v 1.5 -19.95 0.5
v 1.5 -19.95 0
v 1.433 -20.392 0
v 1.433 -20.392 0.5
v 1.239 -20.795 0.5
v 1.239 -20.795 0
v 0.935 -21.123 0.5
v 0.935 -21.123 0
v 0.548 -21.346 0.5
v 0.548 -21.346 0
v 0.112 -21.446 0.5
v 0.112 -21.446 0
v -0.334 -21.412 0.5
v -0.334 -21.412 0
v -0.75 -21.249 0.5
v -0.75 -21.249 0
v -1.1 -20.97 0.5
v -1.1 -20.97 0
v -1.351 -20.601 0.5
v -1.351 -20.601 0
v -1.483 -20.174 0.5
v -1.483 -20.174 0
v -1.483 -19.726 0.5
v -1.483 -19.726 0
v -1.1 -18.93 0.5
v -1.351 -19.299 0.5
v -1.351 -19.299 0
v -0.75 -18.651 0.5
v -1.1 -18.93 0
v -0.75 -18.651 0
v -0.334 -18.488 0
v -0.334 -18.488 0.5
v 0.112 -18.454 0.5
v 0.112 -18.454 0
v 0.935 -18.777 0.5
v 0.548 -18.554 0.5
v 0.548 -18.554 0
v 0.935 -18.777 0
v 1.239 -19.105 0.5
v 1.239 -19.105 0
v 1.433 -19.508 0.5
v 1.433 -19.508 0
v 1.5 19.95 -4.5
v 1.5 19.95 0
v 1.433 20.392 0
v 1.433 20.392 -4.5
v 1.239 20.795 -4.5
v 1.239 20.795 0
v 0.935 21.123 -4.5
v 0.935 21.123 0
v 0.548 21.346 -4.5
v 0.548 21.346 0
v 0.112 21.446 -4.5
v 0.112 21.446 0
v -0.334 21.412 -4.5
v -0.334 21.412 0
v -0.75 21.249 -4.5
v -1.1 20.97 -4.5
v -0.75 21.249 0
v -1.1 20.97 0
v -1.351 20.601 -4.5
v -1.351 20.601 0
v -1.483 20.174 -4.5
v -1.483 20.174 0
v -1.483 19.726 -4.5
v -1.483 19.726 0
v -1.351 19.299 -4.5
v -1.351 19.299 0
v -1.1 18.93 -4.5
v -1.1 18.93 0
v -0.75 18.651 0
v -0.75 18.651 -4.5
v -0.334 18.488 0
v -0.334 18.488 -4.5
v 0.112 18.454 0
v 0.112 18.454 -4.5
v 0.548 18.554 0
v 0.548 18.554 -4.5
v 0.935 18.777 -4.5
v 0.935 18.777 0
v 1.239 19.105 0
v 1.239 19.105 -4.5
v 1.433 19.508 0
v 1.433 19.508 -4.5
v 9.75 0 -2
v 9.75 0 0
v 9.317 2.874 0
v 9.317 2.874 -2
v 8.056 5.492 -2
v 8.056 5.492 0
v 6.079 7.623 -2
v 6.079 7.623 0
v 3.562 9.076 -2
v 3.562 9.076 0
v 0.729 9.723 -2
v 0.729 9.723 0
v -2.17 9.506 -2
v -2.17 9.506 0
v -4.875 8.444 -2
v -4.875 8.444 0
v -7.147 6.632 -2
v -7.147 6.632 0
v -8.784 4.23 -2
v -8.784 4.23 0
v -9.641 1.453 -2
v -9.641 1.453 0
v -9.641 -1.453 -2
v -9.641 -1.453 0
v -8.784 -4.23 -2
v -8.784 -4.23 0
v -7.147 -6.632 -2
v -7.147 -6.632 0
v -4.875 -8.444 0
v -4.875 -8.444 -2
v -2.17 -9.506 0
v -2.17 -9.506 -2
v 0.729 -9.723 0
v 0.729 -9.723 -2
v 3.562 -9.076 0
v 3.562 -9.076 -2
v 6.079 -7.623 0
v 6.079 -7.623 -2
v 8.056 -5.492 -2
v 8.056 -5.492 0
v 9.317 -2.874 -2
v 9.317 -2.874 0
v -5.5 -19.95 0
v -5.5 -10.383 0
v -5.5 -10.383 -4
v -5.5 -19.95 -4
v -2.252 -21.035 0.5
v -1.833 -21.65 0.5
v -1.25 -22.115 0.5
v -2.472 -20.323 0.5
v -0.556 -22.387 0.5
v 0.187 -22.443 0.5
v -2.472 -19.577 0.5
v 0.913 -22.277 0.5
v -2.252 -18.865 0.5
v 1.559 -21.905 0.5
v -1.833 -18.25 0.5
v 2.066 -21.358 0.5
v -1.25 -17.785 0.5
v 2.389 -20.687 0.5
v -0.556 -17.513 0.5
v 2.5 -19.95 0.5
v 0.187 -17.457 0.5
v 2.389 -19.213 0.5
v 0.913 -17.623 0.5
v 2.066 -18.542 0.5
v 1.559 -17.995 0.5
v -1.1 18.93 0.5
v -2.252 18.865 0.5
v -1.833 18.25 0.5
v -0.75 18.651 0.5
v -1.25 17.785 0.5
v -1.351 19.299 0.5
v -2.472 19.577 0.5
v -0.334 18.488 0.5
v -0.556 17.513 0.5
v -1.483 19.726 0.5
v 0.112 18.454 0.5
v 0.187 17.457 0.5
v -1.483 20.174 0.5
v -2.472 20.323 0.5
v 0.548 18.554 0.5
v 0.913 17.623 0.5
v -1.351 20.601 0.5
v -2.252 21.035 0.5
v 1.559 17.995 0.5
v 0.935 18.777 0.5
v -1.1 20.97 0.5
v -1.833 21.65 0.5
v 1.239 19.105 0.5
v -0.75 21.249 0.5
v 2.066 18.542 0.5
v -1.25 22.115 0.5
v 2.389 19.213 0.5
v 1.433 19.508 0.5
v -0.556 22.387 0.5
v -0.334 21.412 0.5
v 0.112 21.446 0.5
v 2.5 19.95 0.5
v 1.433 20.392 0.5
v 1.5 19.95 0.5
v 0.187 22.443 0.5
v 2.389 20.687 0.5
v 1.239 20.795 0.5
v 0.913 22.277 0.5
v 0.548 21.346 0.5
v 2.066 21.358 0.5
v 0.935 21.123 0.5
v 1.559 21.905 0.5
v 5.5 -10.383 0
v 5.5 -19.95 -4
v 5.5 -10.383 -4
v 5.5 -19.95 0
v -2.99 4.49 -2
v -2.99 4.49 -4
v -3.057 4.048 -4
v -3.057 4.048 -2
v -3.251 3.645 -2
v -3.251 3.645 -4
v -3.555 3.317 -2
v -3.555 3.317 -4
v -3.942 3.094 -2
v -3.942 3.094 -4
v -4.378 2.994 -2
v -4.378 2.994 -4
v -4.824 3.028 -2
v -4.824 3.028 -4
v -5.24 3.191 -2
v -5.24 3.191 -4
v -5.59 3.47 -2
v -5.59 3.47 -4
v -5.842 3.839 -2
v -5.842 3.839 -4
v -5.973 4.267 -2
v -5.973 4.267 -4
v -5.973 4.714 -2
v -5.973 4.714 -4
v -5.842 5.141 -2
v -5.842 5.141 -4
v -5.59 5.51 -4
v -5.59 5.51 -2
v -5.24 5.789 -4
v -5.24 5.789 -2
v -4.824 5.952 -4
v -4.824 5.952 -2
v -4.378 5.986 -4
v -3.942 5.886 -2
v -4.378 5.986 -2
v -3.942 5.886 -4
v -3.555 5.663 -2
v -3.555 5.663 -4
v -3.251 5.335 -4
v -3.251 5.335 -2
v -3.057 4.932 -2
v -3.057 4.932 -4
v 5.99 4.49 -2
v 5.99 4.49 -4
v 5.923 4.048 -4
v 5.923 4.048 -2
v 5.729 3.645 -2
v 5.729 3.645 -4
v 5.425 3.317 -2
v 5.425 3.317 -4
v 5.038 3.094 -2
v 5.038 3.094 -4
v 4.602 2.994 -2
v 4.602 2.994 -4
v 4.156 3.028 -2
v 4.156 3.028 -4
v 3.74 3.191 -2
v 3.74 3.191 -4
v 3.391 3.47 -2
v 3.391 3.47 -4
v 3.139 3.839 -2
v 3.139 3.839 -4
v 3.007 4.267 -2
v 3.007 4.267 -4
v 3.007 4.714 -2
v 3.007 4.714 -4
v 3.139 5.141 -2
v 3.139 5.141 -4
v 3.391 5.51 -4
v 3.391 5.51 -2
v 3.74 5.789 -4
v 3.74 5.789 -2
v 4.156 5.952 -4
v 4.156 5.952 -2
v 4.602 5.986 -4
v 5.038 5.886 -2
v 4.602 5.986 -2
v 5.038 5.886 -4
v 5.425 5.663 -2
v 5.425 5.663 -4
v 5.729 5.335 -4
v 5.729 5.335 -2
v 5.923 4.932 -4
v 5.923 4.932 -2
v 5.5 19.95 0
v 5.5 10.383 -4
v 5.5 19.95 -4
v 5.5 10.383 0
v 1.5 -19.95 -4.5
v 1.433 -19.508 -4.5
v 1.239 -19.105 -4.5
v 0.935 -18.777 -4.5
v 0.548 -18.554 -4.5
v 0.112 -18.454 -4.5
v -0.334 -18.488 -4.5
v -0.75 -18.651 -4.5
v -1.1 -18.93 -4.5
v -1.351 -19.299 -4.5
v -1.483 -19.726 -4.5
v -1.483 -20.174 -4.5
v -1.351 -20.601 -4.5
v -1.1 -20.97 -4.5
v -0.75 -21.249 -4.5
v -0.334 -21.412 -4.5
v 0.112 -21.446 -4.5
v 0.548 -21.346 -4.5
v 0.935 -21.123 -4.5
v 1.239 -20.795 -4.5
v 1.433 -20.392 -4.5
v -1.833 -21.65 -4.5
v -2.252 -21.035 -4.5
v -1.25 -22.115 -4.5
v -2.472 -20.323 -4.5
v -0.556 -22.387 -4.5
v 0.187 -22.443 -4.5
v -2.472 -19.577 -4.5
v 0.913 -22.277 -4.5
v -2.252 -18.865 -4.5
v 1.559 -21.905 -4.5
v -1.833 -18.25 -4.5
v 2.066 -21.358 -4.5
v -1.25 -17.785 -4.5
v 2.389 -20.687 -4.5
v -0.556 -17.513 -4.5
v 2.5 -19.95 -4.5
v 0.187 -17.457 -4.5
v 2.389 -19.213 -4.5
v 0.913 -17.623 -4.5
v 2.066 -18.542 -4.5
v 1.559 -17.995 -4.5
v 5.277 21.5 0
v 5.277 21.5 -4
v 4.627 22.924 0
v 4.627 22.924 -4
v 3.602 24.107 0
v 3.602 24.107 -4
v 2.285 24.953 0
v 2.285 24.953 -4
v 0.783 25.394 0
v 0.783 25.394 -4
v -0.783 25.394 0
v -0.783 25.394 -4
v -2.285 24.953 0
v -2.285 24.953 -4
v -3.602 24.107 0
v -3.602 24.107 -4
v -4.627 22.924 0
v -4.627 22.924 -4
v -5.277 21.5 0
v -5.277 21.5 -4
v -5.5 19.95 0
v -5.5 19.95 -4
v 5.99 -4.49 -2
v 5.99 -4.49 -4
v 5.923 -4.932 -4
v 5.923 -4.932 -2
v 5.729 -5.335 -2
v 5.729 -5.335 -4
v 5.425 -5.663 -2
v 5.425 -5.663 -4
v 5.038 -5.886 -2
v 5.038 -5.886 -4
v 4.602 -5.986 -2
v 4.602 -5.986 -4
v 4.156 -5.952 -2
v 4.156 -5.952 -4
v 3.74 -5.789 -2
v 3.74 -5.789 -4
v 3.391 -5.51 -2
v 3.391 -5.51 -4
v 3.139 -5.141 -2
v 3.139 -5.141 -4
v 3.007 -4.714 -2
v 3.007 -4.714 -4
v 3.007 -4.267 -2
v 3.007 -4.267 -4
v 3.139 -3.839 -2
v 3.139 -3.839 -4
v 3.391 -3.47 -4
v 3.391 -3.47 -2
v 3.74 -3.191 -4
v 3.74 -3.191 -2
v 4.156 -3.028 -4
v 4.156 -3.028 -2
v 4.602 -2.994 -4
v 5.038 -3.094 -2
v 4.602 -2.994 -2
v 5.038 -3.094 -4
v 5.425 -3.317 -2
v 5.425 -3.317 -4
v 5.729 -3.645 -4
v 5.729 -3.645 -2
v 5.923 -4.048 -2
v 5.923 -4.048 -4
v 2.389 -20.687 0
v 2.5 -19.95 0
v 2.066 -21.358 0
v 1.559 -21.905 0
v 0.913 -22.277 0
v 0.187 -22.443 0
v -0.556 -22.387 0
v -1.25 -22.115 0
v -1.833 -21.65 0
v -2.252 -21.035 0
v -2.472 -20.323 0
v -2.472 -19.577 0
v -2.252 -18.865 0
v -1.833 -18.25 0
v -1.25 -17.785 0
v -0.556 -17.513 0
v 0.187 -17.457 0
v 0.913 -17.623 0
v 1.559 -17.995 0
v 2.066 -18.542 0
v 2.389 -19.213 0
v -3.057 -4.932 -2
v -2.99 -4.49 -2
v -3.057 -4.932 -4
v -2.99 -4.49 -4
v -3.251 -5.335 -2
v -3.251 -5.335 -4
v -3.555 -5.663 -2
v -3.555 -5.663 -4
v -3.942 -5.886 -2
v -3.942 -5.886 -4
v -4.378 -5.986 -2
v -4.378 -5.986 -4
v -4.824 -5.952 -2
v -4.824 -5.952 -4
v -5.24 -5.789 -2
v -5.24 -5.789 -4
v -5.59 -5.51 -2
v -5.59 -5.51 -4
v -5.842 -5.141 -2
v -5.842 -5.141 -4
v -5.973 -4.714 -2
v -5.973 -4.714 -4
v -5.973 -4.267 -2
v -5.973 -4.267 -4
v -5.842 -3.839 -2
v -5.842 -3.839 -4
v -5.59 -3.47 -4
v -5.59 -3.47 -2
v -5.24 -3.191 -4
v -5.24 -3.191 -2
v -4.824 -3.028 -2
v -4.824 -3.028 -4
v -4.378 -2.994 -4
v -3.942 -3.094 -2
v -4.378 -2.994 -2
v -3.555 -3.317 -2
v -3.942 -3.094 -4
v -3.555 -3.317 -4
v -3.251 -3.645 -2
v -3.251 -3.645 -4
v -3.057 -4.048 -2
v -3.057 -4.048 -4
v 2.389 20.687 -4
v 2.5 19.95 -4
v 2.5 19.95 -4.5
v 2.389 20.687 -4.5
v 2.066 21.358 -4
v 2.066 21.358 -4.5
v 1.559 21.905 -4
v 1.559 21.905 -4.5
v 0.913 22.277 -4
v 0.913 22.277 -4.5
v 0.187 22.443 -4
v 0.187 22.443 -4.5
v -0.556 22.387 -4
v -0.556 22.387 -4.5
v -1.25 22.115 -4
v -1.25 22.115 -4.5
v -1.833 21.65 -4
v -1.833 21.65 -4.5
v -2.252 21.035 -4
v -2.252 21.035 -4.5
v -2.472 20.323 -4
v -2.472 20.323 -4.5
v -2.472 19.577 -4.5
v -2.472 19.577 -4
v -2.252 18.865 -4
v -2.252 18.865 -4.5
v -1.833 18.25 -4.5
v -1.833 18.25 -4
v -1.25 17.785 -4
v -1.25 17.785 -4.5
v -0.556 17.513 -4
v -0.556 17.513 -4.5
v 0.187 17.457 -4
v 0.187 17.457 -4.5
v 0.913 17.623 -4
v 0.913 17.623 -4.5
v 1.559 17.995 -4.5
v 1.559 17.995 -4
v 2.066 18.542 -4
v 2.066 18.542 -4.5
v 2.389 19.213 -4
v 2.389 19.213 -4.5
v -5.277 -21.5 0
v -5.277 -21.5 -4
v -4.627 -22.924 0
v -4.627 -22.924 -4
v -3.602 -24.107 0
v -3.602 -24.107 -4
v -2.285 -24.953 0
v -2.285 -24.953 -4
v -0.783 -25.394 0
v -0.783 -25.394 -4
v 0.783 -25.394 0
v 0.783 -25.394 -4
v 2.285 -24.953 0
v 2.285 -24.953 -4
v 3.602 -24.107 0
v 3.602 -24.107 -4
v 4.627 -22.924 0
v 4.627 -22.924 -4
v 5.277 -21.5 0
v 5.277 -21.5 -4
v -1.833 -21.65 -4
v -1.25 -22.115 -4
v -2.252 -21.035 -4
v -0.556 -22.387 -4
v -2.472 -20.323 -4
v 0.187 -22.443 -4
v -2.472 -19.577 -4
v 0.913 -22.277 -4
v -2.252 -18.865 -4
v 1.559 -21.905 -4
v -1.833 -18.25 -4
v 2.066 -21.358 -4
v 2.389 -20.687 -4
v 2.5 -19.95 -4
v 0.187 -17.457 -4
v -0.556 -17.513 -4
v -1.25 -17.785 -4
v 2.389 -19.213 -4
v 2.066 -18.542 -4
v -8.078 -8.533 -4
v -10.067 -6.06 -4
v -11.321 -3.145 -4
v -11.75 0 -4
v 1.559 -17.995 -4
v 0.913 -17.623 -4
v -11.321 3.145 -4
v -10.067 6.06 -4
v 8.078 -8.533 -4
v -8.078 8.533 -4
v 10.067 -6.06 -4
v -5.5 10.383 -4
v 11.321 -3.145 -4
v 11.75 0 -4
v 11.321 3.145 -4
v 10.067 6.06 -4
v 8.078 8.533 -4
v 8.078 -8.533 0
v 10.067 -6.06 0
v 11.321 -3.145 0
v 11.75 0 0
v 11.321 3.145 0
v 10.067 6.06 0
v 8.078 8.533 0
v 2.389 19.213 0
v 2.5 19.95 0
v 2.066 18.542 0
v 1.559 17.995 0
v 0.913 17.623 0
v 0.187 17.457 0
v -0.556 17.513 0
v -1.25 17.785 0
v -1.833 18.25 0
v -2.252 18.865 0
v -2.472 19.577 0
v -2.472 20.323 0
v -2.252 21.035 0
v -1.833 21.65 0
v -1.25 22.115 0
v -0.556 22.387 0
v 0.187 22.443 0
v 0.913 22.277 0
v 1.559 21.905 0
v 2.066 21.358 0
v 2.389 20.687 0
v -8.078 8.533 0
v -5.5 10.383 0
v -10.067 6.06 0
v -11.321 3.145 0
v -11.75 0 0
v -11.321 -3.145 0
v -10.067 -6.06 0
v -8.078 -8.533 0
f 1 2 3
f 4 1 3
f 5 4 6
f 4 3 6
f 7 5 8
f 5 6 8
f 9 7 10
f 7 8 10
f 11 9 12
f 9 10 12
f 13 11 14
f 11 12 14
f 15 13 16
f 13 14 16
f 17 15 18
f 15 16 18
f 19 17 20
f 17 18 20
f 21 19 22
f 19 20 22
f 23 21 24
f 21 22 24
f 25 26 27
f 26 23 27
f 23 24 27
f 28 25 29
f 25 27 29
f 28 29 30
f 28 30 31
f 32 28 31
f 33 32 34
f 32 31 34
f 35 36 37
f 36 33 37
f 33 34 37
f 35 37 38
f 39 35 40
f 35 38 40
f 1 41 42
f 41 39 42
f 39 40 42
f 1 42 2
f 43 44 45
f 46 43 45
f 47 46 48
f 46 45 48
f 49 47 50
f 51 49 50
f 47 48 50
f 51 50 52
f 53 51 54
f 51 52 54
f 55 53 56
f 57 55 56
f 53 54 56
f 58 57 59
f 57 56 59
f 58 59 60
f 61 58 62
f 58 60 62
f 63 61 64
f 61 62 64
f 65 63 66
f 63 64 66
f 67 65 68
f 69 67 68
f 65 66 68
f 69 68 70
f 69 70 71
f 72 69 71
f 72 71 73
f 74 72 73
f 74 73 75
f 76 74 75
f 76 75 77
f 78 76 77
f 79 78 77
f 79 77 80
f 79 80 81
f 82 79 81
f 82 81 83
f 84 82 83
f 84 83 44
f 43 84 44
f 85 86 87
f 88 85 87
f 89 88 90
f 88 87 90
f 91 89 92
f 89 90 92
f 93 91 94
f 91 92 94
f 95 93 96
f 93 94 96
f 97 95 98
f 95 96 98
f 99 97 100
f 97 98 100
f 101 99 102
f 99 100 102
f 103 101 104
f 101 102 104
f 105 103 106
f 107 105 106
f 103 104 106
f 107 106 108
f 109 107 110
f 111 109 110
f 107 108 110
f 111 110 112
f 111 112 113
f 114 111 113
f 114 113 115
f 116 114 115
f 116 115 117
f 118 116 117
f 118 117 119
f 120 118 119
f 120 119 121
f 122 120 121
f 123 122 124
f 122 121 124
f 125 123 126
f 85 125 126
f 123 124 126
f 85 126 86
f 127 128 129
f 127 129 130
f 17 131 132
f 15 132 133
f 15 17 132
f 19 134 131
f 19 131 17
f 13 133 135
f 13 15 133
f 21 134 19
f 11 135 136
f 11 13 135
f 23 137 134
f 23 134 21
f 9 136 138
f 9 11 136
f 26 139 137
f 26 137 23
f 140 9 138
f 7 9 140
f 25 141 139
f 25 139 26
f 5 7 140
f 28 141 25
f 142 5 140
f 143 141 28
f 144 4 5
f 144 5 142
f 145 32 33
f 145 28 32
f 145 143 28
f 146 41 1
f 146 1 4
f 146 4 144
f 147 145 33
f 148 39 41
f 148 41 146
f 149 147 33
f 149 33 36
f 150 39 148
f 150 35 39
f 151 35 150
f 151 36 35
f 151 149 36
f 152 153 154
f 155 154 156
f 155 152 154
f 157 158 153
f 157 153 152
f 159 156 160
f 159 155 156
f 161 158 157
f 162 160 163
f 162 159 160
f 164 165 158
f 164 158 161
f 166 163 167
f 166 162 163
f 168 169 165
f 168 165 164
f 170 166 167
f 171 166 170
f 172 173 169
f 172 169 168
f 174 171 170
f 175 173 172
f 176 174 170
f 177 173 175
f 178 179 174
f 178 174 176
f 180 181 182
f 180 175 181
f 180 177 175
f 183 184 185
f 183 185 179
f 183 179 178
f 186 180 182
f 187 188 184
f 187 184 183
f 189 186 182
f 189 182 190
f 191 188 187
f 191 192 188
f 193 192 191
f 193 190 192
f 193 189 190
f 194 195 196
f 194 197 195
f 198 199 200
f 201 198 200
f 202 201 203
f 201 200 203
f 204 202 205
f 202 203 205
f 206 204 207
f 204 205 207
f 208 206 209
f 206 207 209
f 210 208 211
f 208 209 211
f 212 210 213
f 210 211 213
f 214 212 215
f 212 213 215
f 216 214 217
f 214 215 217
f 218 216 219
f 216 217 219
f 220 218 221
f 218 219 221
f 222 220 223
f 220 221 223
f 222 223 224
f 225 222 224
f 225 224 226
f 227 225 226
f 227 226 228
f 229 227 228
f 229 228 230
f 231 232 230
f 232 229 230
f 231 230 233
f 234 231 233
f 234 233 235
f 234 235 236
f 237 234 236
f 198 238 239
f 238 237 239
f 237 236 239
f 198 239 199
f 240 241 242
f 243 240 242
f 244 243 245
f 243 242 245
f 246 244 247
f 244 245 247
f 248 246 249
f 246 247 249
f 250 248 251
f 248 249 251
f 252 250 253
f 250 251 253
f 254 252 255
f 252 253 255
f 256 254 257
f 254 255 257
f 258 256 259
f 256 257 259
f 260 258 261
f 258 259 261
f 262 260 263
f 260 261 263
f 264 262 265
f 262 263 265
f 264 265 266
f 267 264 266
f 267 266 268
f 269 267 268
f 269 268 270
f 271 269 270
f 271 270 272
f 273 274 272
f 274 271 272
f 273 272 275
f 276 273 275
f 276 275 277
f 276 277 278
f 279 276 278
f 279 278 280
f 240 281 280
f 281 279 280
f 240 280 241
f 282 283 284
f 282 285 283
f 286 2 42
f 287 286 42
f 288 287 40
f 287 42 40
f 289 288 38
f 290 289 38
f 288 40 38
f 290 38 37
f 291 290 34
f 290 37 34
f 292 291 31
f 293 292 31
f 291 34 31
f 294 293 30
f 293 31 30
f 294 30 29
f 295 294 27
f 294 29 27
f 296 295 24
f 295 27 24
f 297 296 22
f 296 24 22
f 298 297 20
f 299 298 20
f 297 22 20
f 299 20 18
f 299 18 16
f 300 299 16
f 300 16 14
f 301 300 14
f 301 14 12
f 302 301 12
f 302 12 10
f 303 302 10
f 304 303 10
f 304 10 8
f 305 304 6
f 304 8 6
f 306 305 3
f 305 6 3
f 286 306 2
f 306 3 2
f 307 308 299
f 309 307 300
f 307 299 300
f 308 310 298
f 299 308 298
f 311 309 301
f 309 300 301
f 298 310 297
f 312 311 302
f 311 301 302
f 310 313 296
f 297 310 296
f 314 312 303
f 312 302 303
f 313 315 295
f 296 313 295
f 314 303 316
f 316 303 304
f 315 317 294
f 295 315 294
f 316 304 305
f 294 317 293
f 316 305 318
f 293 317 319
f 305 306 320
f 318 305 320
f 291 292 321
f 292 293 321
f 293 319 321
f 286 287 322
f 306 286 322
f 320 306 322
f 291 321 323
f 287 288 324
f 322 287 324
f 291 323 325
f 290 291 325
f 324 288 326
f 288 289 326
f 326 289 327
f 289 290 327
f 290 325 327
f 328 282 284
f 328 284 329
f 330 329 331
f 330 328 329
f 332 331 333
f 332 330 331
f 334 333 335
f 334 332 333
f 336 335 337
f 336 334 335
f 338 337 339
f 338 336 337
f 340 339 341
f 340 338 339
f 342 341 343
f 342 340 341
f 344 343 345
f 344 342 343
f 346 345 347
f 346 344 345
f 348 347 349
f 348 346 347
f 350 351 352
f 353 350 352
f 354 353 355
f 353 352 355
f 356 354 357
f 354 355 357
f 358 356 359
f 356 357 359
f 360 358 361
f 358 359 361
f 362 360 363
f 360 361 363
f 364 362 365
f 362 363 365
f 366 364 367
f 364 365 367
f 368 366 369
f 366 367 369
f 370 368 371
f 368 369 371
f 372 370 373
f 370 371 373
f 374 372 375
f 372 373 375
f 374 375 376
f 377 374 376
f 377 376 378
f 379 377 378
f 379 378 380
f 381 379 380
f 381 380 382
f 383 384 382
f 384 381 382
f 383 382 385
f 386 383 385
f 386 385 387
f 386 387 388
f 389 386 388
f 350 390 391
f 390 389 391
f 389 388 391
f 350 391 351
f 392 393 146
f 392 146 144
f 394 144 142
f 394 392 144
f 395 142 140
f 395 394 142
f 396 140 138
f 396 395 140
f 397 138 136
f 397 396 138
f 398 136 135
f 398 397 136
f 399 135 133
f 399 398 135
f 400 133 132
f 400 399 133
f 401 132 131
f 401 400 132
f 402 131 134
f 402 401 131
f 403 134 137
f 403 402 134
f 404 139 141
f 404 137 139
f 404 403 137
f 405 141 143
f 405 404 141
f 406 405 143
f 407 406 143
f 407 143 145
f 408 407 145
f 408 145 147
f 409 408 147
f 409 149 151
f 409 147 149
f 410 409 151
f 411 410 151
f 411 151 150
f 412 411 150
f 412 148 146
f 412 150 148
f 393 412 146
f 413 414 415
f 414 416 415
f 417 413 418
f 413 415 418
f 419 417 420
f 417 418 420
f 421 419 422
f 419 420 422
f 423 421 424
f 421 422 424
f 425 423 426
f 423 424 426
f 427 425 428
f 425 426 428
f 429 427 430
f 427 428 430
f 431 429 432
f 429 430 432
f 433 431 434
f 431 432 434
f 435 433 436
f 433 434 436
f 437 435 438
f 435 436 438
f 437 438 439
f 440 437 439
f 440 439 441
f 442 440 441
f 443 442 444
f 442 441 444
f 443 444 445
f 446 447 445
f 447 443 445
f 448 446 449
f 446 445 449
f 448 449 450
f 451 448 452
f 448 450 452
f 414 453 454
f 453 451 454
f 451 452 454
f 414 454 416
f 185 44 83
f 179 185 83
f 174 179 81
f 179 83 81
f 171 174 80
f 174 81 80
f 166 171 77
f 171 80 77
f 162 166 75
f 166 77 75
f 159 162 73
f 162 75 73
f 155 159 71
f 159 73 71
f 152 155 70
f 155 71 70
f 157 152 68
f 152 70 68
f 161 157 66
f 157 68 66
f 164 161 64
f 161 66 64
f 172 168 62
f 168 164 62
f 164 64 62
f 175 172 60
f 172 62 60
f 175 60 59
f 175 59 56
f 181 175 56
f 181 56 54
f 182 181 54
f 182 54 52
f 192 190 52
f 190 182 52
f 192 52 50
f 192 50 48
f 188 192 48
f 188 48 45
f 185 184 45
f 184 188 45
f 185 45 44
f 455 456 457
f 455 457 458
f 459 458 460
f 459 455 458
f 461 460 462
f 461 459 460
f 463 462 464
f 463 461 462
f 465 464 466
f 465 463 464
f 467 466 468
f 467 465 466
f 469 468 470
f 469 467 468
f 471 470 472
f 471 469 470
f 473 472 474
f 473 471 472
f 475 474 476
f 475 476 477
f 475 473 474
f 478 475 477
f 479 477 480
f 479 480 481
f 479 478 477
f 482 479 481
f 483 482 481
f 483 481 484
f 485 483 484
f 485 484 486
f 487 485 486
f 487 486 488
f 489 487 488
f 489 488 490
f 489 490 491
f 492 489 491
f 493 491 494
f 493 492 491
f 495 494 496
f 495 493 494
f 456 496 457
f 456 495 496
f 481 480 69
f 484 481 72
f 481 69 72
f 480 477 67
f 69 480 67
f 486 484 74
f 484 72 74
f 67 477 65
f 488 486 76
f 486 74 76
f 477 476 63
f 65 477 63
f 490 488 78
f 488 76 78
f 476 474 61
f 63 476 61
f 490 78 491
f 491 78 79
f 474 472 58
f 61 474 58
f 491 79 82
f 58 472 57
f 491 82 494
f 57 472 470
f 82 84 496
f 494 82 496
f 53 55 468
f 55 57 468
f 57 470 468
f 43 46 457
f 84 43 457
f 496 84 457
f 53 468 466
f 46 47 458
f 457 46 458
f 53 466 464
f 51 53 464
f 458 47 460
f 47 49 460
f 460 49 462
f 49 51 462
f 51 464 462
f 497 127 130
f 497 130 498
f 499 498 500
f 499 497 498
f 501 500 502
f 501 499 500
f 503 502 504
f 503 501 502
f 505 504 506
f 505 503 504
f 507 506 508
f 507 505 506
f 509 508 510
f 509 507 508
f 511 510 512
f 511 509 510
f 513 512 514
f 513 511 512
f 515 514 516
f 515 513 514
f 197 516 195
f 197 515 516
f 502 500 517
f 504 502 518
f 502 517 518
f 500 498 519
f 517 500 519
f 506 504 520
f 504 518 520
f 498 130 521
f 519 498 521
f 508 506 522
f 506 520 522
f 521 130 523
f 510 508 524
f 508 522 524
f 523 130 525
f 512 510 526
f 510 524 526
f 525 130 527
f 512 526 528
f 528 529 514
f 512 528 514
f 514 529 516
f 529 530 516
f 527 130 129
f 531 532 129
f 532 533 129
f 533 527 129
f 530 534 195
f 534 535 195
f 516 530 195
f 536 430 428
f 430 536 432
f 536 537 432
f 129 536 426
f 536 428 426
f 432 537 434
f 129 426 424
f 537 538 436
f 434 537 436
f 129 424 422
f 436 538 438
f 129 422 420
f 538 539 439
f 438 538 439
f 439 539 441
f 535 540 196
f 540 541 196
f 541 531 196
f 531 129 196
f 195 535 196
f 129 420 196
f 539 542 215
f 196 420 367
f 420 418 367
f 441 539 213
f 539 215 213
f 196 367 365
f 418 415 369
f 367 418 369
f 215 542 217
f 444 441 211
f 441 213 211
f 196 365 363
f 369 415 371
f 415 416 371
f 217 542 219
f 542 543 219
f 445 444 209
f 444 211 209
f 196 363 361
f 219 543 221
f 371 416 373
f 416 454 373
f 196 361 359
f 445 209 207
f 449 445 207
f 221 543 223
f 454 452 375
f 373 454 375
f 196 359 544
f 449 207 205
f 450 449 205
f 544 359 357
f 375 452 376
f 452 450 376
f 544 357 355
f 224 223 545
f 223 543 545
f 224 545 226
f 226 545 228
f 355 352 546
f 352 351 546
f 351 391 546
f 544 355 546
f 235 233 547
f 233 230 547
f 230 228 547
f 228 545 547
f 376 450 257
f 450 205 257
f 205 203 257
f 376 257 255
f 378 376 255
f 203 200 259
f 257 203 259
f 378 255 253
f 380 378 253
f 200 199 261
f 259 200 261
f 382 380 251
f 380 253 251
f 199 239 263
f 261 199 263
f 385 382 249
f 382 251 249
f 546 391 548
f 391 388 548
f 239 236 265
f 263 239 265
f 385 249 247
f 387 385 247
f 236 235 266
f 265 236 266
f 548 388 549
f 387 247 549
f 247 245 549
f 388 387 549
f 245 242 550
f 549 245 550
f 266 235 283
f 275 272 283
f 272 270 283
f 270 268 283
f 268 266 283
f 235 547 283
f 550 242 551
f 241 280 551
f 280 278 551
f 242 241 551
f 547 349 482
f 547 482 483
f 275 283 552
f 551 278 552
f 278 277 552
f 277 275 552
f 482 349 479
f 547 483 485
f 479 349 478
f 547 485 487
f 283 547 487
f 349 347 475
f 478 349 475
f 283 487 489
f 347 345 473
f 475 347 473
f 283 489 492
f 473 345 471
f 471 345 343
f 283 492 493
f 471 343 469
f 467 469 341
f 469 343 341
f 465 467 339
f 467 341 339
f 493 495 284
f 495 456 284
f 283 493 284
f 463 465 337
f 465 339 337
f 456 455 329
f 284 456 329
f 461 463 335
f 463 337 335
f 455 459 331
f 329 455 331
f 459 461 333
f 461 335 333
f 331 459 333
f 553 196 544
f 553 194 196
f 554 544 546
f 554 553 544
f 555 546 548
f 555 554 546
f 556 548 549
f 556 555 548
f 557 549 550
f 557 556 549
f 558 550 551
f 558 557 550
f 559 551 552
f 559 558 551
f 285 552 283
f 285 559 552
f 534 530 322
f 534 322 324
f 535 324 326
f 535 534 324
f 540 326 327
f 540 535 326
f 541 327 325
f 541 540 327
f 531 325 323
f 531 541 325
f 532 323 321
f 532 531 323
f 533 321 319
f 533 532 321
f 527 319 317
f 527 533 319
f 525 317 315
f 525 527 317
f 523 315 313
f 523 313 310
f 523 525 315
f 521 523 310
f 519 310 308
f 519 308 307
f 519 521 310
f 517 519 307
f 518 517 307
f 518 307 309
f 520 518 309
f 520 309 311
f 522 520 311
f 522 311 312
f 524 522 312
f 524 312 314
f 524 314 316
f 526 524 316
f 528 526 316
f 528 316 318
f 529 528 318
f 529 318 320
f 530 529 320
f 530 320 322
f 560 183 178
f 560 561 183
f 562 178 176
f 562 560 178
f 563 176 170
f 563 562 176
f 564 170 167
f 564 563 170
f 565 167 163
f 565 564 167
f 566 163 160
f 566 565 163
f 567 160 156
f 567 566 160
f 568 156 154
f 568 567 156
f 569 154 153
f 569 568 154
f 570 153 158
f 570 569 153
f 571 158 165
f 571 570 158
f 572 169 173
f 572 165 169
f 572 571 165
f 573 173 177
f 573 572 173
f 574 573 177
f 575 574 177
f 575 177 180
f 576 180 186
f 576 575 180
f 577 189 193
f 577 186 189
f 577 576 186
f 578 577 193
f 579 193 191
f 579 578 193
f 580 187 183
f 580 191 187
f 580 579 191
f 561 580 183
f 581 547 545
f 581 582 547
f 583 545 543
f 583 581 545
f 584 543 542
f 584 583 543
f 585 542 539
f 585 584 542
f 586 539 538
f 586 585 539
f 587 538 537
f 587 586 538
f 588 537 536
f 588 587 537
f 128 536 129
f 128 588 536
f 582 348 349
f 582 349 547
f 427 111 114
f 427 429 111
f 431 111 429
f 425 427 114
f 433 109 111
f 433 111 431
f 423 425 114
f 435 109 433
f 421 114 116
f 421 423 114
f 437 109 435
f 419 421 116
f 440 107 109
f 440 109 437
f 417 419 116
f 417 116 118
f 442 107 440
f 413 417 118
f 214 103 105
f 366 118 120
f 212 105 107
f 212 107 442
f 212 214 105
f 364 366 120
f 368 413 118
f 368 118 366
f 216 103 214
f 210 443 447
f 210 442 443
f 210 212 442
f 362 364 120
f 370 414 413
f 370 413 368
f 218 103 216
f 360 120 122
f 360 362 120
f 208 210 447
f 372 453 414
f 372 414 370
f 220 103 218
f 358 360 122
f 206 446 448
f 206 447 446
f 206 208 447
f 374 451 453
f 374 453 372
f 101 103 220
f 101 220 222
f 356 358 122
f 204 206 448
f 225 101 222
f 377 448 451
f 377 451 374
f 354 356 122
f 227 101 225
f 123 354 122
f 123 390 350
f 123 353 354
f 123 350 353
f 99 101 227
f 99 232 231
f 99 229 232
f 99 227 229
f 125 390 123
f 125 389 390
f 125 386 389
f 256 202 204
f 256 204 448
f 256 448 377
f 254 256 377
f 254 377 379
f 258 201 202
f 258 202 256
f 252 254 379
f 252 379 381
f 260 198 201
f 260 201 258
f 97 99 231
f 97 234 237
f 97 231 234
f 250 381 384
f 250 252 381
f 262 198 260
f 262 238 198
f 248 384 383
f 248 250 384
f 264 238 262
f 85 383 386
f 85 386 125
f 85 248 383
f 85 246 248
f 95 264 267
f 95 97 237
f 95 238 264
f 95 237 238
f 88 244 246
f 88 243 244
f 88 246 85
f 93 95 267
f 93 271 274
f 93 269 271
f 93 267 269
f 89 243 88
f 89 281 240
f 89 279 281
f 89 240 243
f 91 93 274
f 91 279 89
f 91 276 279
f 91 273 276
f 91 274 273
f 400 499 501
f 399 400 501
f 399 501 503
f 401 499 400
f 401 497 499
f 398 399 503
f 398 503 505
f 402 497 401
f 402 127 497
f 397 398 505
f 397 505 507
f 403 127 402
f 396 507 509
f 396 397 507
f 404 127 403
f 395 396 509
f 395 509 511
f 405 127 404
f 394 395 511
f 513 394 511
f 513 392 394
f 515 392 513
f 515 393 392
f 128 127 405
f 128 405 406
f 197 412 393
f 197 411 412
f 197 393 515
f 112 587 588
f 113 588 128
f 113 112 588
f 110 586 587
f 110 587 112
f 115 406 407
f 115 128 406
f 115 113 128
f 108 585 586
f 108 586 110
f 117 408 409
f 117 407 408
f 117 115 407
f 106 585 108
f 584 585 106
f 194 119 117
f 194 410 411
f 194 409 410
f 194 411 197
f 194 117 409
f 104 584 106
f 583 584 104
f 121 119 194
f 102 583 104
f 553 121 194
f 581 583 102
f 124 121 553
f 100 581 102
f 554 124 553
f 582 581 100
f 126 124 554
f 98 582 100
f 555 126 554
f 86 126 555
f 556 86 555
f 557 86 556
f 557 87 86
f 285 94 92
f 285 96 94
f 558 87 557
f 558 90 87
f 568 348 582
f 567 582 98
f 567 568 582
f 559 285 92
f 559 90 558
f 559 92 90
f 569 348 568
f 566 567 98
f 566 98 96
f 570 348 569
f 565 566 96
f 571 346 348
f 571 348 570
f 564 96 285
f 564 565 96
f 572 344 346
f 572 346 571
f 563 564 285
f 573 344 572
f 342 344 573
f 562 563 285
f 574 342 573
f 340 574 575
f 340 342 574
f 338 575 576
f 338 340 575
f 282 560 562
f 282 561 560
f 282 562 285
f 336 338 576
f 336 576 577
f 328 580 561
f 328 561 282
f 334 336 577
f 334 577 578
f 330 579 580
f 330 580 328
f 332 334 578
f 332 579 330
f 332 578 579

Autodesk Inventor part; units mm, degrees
ref_plane "YZ Plane" through (0, 0, 0) normal (1, 0, 0) x (0, 1, 0)
ref_plane "XZ Plane" through (0, 0, 0) normal (0, 1, 0) x (-1, 0, 0)
ref_plane "XY Plane" through (0, 0, 0) normal (0, 0, 1) x (1, 0, 0)
sketch "Skizze1" plane through (0, 0, 0) normal (0, 0, 1) x (1, 0, 0)
  line L0 (0, -19.95) -> (0, 19.95) construction
  arc A0 (-5.5, -19.95) -> (5.5, -19.95) centre (0, -19.95) ccw
  arc A1 (5.5, 19.95) -> (-5.5, 19.95) centre (0, 19.95) ccw
  line L1 (0, 37.03) -> (0, -37.03) construction
  line L2 (-16.45, 0) -> (16.45, 0) construction
  circle A2 centre (0, 19.95) radius 1.5
  circle A3 centre (0, -19.95) radius 1.5
  circle A4 centre (0, 19.95) radius 6.5 construction
  circle A5 centre (0, -19.95) radius 6.5 construction
  line L3 (0, 26.45) -> (0, -26.45) construction
  circle A6 centre (0, 19.95) radius 2.5
  circle A7 centre (0, -19.95) radius 2.5
  circle A8 centre (0, 0) radius 9.75
  line L4 (-5.5, 19.95) -> (-5.5, 10.3833)
  line L5 (-5.5, -10.3833) -> (-5.5, -19.95)
  line L6 (5.5, -19.95) -> (5.5, -10.3833)
  line L7 (5.5, 10.3833) -> (5.5, 19.95)
  arc A9 (5.5, -10.3833) -> (5.5, 10.3833) centre (0, 0) ccw
  arc A10 (-5.5, 10.3833) -> (-5.5, -10.3833) centre (0, 0) ccw
  circle A11 centre (0, 0) radius 6.35 construction
  circle A12 centre (-4.4901, 4.4901) radius 1.5
  circle A13 centre (-4.4901, -4.4901) radius 1.5
  circle A14 centre (4.4901, -4.4901) radius 1.5
  circle A15 centre (4.4901, 4.4901) radius 1.5
  line L8 (-4.4901, 4.4901) -> (0, 0) construction
  dimension "d4" = 13
  dimension "d31" = 12.7
  dimension "d1" = 3
  dimension "d5" = 52.9
  dimension "d19" = 1
  dimension "d26" = 19.5
  dimension "d28" = 2
  dimension "d32" = 3
  dimension "d35" = 360
  dimension "d37" = 45
  dimension "d38" = 3
extrude "Extrusion1" add sketch "Skizze1" against normal blind 4 contours L5 A10 L4 A1 L7 A9 L6 A0 | A6 | A7
extrude "Extrusion4" add sketch "Skizze1" against normal blind 0.5 from surface at -4 contours A6 | A7
extrude "Extrusion6" add sketch "Skizze1" along normal blind 2 from surface at -4 contours A8
extrude "Extrusion7" add sketch "Skizze1" along normal blind 0.5 contours A6 | A7
properties part number "HarmonicDrive-WaveGenerator-Bottom"
